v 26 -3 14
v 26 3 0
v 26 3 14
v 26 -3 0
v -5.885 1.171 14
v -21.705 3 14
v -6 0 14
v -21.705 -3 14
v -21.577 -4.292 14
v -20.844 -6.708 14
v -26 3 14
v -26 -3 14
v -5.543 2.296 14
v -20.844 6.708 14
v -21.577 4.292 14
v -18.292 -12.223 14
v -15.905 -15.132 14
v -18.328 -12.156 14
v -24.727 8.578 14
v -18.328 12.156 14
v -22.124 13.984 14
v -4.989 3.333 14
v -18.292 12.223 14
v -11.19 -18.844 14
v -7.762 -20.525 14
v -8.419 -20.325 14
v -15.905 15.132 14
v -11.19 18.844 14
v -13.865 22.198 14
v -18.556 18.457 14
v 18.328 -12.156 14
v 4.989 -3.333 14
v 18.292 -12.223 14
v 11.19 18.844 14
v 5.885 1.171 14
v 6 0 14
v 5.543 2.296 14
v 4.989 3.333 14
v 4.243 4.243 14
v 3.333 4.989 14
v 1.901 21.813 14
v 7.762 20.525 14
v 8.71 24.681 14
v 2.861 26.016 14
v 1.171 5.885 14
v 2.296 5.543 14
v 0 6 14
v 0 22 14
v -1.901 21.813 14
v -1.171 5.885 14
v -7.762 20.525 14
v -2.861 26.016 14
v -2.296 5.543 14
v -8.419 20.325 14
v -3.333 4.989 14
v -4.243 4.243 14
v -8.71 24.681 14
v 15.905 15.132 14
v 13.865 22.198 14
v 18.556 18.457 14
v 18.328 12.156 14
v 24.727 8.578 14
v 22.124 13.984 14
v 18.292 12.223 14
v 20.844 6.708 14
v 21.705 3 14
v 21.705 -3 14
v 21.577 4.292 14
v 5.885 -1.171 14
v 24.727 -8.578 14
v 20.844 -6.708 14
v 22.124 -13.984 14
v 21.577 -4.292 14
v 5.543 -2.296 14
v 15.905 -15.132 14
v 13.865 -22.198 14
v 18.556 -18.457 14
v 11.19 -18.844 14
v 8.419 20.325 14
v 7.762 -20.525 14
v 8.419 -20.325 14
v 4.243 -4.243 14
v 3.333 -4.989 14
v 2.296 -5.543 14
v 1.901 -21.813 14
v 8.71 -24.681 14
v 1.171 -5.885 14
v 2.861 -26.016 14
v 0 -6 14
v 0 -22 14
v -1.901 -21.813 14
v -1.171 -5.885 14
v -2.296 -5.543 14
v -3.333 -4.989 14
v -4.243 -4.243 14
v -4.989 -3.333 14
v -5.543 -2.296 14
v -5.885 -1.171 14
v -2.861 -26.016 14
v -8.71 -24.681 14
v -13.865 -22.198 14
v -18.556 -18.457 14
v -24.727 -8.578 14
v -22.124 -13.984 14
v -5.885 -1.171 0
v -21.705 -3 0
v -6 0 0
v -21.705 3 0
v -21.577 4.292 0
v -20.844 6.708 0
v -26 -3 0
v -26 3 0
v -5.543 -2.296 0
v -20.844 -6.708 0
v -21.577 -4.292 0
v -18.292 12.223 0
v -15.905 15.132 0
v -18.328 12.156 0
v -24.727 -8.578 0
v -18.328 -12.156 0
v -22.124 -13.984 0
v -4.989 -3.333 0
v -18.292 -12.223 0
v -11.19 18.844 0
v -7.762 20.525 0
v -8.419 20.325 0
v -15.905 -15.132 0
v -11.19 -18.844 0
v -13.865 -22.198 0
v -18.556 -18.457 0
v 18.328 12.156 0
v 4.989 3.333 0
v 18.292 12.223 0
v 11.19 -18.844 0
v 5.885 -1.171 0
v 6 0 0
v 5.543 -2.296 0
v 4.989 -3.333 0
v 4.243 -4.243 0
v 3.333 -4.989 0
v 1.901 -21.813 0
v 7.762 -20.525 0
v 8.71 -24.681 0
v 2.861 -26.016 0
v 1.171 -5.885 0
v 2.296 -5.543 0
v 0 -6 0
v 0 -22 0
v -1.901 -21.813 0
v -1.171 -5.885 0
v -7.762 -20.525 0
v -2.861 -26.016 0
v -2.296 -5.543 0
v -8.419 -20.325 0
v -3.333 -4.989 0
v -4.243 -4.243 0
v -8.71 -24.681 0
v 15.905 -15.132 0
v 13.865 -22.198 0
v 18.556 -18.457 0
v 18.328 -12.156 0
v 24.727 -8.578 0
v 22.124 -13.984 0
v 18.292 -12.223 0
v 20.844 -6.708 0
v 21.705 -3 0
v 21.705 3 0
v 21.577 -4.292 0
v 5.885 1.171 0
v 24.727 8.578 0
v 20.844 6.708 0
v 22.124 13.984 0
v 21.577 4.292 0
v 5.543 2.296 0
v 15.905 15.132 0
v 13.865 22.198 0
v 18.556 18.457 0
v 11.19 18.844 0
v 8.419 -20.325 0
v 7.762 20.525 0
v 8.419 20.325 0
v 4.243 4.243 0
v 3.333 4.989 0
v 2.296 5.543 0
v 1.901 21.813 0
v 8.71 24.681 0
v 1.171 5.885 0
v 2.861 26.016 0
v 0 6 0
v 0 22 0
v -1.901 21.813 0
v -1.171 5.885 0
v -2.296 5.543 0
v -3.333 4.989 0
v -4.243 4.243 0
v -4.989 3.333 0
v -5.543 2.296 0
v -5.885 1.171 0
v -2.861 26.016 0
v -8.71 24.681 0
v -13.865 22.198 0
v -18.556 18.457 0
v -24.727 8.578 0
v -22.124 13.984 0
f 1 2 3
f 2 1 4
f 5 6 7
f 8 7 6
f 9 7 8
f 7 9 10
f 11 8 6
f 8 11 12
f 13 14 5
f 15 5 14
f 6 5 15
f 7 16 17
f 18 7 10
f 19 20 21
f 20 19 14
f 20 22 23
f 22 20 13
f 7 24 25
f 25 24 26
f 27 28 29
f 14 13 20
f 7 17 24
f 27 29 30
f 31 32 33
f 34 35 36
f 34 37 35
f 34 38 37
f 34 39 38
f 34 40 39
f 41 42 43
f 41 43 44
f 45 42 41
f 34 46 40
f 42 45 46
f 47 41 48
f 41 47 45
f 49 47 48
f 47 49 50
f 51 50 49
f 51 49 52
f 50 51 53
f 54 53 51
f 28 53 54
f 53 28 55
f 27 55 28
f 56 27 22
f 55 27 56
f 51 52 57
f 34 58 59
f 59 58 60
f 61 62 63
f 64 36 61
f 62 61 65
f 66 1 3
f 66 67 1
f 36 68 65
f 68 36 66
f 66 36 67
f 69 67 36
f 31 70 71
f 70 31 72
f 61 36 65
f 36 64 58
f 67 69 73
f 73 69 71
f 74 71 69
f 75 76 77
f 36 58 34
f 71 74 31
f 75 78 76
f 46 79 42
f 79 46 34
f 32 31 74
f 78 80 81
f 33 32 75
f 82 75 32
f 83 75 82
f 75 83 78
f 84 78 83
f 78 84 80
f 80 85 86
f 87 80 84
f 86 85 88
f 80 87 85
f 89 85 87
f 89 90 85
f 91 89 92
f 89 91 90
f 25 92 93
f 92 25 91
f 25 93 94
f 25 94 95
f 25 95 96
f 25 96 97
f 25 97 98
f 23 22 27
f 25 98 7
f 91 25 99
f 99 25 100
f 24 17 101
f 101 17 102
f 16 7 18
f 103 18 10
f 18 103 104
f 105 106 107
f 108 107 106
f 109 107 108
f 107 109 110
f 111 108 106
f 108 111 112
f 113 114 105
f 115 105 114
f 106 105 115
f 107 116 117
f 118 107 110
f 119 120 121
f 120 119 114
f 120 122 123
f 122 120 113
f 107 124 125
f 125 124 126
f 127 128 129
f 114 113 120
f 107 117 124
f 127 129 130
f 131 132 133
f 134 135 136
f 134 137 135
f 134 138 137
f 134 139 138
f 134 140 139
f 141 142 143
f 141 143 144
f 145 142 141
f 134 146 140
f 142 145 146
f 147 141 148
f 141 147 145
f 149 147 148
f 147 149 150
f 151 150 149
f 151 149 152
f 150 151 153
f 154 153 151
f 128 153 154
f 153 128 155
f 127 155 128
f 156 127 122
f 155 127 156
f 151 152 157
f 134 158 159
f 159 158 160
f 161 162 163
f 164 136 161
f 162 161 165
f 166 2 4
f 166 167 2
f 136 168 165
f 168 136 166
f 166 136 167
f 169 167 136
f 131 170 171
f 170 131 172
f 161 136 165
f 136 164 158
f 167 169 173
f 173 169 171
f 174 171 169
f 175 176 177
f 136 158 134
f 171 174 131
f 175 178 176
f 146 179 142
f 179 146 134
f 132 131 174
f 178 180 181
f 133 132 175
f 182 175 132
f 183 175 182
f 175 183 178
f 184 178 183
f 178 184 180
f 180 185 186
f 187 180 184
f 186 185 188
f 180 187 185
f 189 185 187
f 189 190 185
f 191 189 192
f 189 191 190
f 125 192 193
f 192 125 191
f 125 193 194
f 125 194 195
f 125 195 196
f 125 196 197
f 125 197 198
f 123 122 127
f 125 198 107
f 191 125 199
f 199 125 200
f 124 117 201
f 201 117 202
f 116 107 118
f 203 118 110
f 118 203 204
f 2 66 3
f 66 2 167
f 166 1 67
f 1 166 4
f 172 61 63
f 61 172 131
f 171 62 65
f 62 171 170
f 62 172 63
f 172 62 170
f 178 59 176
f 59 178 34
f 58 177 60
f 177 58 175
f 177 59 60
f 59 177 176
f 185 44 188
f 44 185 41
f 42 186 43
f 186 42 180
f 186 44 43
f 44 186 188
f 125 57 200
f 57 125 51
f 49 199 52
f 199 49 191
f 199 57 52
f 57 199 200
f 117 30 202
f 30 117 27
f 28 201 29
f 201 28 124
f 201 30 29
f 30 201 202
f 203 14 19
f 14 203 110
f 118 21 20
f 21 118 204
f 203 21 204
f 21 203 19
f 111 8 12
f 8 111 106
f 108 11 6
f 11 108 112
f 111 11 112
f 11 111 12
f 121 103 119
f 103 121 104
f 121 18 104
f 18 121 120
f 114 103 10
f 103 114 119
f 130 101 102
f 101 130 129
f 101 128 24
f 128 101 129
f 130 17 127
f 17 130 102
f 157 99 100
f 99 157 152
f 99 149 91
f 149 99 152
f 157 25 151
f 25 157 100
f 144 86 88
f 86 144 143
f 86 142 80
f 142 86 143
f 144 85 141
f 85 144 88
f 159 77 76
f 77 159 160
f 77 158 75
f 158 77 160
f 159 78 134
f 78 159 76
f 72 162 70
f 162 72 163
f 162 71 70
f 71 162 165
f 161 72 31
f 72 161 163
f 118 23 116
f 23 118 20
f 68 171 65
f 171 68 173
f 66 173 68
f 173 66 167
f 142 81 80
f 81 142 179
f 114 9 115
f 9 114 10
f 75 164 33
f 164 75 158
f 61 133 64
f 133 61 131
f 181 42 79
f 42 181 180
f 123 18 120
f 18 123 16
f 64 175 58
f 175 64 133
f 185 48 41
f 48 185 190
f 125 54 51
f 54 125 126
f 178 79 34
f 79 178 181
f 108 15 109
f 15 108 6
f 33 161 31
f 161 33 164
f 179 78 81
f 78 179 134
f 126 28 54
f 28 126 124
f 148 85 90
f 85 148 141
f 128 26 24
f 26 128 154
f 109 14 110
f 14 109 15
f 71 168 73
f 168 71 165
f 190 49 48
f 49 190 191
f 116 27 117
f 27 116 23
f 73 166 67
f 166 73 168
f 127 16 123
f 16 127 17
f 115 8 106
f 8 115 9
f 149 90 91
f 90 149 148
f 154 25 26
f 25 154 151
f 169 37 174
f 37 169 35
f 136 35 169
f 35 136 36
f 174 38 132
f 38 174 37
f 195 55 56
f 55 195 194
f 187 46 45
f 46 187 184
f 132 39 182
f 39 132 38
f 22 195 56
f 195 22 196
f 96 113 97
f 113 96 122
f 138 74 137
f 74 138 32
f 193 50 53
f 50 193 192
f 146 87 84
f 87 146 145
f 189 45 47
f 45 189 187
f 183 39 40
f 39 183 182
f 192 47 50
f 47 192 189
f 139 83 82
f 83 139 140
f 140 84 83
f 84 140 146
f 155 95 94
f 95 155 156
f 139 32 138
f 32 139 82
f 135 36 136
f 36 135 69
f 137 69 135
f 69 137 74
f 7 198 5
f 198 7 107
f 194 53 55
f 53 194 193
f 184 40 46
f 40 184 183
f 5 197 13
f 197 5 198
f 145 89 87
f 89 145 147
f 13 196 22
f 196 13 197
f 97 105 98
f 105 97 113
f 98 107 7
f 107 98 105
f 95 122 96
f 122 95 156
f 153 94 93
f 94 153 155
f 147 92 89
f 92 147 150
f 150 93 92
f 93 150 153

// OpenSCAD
$fn = 32;

// ----------------------------------------------------------------------
// Spur blank: bored gear blank
// ----------------------------------------------------------------------

// --- parameters (mm) ---
disc_r = 22;              // blank root radius
disc_t = 14;              // blank thickness
n_teeth = 14;             // stub tooth count
tooth_w = 6;              // tooth width at the root
tooth_h = 4;              // tooth height above the root
bore_r = 6;               // central bore radius

out_r = disc_r + tooth_h;  // tip radius
bbox_x = 52.0;  // measured width over the teeth
bbox_y = 52.03;  // measured depth over the teeth

difference() {
union() {
  cylinder(r = disc_r, h = disc_t);
  for (i = [0 : n_teeth - 1])
    rotate([0, 0, i * 360 / n_teeth])
      translate([disc_r - 1, -tooth_w / 2, 0])
        cube([tooth_h + 1, tooth_w, disc_t]);
}
  translate([0, 0, -1]) cylinder(r = bore_r, h = disc_t + 2);
}
